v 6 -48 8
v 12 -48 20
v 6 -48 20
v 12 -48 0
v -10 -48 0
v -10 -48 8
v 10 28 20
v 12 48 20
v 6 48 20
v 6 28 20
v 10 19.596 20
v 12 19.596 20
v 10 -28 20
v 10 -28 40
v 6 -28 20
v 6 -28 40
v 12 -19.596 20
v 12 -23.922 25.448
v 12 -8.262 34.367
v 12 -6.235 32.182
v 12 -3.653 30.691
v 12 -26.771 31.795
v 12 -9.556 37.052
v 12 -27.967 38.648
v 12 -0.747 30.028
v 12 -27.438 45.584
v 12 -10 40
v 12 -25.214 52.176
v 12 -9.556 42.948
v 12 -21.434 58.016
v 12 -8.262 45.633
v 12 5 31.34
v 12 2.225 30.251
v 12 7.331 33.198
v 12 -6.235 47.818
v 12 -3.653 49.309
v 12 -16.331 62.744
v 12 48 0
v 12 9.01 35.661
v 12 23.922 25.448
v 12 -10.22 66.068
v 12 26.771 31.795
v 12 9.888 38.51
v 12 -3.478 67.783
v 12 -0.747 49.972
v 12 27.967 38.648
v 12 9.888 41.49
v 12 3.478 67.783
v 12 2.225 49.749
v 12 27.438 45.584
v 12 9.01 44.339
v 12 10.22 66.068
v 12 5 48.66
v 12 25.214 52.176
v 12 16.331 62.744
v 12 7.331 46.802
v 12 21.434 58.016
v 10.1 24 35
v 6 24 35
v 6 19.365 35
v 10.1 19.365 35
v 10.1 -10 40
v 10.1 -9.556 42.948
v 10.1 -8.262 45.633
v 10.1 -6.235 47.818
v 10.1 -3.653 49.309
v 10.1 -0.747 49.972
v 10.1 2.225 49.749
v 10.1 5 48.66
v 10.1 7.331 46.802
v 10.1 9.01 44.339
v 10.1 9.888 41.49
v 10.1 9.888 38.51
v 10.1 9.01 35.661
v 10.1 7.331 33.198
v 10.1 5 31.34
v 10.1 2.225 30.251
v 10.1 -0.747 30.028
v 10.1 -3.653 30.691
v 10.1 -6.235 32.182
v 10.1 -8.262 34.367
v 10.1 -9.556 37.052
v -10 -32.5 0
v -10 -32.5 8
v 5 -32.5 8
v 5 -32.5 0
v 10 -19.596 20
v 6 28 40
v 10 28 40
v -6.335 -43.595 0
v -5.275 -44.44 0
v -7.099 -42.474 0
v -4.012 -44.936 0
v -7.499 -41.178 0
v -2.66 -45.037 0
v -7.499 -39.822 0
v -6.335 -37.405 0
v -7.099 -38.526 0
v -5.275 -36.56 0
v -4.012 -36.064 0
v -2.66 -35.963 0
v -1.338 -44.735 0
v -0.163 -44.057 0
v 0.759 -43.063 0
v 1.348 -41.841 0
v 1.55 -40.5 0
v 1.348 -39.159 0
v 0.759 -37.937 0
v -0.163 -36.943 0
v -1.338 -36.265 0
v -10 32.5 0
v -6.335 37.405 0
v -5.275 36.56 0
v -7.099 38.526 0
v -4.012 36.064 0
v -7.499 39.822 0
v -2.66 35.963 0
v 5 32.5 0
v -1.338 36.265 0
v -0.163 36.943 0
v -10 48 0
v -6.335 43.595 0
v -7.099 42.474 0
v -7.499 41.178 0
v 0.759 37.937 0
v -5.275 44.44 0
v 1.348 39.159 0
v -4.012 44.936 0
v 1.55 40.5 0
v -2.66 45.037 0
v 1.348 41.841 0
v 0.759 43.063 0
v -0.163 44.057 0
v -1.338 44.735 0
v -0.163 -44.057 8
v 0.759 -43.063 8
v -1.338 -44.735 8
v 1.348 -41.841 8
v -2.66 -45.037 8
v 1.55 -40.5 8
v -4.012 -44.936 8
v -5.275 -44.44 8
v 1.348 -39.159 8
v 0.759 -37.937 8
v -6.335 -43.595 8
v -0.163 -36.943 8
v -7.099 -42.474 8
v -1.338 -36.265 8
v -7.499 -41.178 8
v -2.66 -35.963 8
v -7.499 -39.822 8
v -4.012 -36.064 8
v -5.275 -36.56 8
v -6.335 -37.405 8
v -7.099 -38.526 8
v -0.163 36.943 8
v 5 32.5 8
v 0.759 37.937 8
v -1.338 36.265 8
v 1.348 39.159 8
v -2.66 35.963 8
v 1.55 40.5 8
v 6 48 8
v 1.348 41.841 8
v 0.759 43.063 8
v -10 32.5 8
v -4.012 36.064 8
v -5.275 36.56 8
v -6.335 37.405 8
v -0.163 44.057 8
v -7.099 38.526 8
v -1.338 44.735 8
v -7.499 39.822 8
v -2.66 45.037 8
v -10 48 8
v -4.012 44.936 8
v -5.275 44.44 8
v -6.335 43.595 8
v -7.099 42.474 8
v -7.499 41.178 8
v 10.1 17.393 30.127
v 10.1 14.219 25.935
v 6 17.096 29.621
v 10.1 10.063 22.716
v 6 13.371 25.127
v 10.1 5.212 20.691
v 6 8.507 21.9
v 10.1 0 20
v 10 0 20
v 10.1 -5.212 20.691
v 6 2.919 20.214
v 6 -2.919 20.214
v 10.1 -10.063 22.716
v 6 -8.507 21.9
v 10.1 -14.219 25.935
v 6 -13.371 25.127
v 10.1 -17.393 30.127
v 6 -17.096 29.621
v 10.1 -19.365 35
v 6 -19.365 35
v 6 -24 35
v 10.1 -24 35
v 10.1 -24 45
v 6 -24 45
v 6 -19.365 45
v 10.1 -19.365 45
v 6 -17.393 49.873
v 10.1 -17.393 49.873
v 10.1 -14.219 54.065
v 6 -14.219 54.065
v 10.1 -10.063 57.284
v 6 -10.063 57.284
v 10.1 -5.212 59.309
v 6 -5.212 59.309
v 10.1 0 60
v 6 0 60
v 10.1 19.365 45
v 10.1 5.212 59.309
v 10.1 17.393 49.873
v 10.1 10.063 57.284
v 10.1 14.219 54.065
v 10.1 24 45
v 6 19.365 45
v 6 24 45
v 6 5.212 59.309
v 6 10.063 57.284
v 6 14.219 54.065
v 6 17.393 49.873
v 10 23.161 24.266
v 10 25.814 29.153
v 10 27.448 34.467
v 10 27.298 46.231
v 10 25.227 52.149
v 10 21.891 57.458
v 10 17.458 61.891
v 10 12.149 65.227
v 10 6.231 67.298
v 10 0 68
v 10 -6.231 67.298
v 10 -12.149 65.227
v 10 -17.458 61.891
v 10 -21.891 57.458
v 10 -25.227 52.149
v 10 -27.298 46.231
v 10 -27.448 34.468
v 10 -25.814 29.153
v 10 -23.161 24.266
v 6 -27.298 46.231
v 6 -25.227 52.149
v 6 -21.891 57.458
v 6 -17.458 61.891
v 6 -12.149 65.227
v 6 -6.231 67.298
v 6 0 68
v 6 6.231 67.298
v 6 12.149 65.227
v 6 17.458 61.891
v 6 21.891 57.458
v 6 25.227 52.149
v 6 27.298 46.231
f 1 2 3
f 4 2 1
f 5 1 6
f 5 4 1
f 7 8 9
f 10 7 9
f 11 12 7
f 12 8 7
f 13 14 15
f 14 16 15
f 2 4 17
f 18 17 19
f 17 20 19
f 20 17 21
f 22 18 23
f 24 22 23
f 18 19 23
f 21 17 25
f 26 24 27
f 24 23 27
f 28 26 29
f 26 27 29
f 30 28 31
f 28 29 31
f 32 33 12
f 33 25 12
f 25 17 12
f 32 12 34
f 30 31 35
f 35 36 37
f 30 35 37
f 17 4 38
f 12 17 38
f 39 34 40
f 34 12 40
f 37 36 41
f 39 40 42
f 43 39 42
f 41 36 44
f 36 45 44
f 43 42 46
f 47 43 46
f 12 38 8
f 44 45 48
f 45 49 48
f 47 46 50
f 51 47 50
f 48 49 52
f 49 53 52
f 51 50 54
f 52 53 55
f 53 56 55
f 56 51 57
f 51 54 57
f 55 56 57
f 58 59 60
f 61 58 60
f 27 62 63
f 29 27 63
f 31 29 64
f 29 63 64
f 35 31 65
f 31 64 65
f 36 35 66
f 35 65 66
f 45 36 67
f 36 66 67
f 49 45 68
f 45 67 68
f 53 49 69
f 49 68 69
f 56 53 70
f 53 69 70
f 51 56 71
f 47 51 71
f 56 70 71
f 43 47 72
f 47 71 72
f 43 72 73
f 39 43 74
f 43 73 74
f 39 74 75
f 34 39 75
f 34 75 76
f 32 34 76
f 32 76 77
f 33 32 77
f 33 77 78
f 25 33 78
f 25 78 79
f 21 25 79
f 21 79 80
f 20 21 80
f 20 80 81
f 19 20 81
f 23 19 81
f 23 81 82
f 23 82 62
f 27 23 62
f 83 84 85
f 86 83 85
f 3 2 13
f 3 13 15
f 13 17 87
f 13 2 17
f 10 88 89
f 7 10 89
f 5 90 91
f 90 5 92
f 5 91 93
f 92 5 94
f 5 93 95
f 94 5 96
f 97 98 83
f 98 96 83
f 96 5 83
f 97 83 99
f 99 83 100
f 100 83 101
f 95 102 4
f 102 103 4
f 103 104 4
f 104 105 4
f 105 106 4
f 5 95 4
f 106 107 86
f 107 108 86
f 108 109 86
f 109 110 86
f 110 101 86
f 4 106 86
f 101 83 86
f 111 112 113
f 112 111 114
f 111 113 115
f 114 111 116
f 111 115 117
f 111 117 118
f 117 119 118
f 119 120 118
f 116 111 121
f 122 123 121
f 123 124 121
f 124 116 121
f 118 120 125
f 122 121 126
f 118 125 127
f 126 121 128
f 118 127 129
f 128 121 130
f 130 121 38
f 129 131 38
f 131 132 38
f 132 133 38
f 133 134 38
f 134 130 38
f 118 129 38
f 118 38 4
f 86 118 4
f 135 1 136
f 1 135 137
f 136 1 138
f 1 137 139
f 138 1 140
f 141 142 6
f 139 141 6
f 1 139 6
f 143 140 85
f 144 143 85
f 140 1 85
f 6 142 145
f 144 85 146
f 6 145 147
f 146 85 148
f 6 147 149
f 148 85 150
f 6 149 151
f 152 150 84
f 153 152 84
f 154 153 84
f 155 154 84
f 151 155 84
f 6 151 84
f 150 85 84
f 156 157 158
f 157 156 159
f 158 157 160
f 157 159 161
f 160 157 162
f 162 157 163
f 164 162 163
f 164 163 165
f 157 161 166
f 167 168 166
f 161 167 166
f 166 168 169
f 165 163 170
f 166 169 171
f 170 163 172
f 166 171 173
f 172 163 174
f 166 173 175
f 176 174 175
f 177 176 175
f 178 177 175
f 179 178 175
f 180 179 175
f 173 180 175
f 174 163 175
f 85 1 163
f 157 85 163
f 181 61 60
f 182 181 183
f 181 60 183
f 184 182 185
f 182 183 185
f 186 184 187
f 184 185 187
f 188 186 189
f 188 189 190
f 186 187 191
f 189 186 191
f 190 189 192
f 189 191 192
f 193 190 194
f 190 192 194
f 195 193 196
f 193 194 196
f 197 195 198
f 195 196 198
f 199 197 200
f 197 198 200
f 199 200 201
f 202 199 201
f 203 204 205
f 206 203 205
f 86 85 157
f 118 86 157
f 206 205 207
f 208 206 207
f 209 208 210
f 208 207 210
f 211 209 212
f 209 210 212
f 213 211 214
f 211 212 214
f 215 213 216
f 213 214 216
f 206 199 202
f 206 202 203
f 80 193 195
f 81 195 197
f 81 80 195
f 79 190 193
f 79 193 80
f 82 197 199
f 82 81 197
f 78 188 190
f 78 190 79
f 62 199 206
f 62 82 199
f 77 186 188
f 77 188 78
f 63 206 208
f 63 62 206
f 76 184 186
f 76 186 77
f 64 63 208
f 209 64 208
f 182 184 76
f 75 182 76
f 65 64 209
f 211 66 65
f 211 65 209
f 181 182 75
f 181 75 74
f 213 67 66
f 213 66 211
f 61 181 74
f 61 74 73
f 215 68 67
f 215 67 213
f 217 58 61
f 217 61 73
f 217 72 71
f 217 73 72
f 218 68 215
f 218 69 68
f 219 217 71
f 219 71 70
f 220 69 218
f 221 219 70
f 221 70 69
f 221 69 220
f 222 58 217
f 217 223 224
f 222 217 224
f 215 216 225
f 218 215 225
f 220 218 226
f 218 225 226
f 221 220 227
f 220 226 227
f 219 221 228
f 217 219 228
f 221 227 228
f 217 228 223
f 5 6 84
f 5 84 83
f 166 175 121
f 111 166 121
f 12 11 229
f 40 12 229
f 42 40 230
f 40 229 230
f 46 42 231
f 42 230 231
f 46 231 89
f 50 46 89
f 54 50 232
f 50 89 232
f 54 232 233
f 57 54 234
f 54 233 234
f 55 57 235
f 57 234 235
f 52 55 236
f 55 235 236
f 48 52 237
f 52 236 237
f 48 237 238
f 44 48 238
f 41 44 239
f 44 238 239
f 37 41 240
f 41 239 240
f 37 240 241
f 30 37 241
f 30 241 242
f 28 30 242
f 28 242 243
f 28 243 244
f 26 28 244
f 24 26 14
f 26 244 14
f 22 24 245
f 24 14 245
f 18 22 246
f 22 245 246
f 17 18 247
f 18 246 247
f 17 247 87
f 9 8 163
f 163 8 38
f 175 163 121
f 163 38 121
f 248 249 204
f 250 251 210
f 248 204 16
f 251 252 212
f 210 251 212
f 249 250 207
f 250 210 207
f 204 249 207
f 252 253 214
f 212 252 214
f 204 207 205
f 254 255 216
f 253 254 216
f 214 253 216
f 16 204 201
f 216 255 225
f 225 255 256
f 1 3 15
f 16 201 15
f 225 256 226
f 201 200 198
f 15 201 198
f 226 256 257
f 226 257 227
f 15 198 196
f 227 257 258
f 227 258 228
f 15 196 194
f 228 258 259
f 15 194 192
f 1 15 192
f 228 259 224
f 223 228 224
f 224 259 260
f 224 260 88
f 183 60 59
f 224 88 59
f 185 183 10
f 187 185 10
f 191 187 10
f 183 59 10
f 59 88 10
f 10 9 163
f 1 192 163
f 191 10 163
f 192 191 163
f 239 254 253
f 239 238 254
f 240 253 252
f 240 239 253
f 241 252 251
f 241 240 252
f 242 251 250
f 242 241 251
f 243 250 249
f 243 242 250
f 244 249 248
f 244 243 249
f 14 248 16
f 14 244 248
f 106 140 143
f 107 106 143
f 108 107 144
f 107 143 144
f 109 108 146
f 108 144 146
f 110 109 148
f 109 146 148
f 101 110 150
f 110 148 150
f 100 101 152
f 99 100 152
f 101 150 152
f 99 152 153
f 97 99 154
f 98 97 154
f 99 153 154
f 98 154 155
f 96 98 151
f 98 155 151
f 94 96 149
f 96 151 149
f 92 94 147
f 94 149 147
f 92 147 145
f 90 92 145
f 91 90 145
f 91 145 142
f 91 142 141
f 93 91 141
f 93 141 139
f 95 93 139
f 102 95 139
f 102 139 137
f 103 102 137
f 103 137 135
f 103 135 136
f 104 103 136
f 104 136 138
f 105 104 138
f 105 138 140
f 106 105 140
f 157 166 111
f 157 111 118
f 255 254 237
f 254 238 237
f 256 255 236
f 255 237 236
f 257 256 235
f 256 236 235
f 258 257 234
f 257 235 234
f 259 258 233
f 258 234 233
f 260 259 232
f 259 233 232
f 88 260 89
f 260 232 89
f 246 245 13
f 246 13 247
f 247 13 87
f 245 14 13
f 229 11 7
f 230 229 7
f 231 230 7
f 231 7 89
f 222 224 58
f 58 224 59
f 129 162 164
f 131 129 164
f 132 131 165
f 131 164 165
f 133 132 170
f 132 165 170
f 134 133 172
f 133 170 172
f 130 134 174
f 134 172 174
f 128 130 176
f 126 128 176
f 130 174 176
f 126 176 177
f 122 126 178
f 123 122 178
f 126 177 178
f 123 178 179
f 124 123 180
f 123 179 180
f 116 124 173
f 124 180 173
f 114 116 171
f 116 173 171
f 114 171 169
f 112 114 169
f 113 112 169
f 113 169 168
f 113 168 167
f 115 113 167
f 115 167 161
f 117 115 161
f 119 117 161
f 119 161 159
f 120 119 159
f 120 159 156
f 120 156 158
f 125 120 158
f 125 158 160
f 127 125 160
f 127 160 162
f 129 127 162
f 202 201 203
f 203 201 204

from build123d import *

# Parameters (mm, degrees)
SKETCH_1_W          = 20
SKETCH_1_H          = 56
EXTRUDE_1_DEPTH     = 8
SKETCH_2_W          = 4
SKETCH_2_H          = 56
EXTRUDE_2_DEPTH     = 60
FILLET_1_R          = 28
SKETCH_5_R          = 28
EXTRUDE_3_DEPTH     = 2
CUT_EXTRUDE_2_DEPTH = 4.1
SKETCH_6_W          = 20
SKETCH_6_H          = 56
EXTRUDE_4_DEPTH     = 2
SKETCH_7_R          = 10
CUT_EXTRUDE_3_DEPTH = 2
EXTRUDE_5_DEPTH     = 20
SKETCH_3_R          = 4.55
CUT_EXTRUDE_1_DEPTH = 60
SKETCH_9_W          = 15
SKETCH_9_H          = 65
CUT_EXTRUDE_4_DEPTH = 78.768888381


with BuildPart() as part:
    # 스케치1 → 보스-돌출1 (new body)
    with BuildSketch(Plane.XY):
        Rectangle(SKETCH_1_W, SKETCH_1_H)
    extrude(amount=EXTRUDE_1_DEPTH)

    # 스케치2 → 보스-돌출2 (add)
    with BuildSketch(Plane.XY.offset(8)):
        with Locations((8, 0)):
            Rectangle(SKETCH_2_W, SKETCH_2_H)
    extrude(amount=EXTRUDE_2_DEPTH)

    # 필렛1
    fillet_1_edges = [part.edges().sort_by_distance(p)[0] for p in [
        (8, 28, 68),
        (8, -28, 68),
    ]]
    fillet(fillet_1_edges, radius=FILLET_1_R - 0.0001)  # a hair under: the kernel refuses the full size

    # 스케치5 → 보스-돌출3 (add)
    with BuildSketch(Plane(origin=(10, 0, 0), x_dir=(0, 0, -1), z_dir=(1, 0, 0))):
        with Locations(Location((-40, 0, 0), (0, 0, 90))):
            Circle(SKETCH_5_R)
    extrude(amount=EXTRUDE_3_DEPTH)

    # 스케치4 → 컷-돌출2 (cut)
    with BuildSketch(Plane.ZY.offset(-6)):
        with BuildLine():
            Line((35, 16), (35, 19.364916731))
            ThreePointArc((35, 19.364916731), (20, 0), (35, -19.364916731))
            Line((35, -19.364916731), (35, -16))
            Line((35, -16), (45, -16))
            Line((45, -16), (45, -19.364916731))
            ThreePointArc((45, -19.364916731), (55.811388301, -12.247448714), (60, 0))
            ThreePointArc((60, 0), (55.811388301, 12.247448714), (45, 19.364916731))
            Line((45, 19.364916731), (45, 16))
            Line((45, 16), (35, 16))
        make_face()
        with BuildLine():
            ThreePointArc((45, -19.364916731), (40, -20), (35, -19.364916731))
            Line((35, -19.364916731), (35, -24))
            Line((35, -24), (45, -24))
            Line((45, -24), (45, -19.364916731))
        make_face()
        with BuildLine():
            Line((35, -16), (35, -19.364916731))
            ThreePointArc((35, -19.364916731), (40, -20), (45, -19.364916731))
            Line((45, -19.364916731), (45, -16))
            Line((45, -16), (35, -16))
        make_face()
        with BuildLine():
            Line((45, 24), (35, 24))
            Line((35, 24), (35, 19.364916731))
            ThreePointArc((35, 19.364916731), (40, 20), (45, 19.364916731))
            Line((45, 19.364916731), (45, 24))
        make_face()
        with BuildLine():
            ThreePointArc((45, 19.364916731), (40, 20), (35, 19.364916731))
            Line((35, 19.364916731), (35, 16))
            Line((35, 16), (45, 16))
            Line((45, 16), (45, 19.364916731))
        make_face()
    extrude(amount=-CUT_EXTRUDE_2_DEPTH, mode=Mode.SUBTRACT)

    # 스케치6 → 보스-돌출4 (add)
    with BuildSketch(Plane(origin=(10, 0, 0), x_dir=(0, 0, -1), z_dir=(1, 0, 0))):
        with Locations((-10, 0)):
            Rectangle(SKETCH_6_W, SKETCH_6_H)
    extrude(amount=EXTRUDE_4_DEPTH)

    # 스케치7 → 컷-돌출3 (cut)
    with BuildSketch(Plane.ZY.offset(-10.1)):
        with Locations(Location((40, 0, 0), (0, 0, 270))):
            Circle(SKETCH_7_R)
    extrude(amount=-CUT_EXTRUDE_3_DEPTH, mode=Mode.SUBTRACT)

    # 스케치8 → 보스-돌출5 (add)
    with BuildSketch(Plane(origin=(0, 28, 0), x_dir=(1, 0, 0), z_dir=(0, 1, 0))):
        Polygon((-10, -8), (-10, 0), (12, 0), (12, -20), (6, -20), (6, -8), align=None)
    extrude_5 = extrude(amount=EXTRUDE_5_DEPTH)

    # 대칭 복사1: 보스-돌출5 across plane
    add(extrude_5.mirror(Plane.ZX))

    # 스케치3 → 컷-돌출1 (cut)
    with BuildSketch(Plane.XY.offset(8)):
        with Locations((-3, -40.5)):
            Circle(SKETCH_3_R)
        with Locations((-3, 40.5)):
            Circle(SKETCH_3_R)
    extrude(amount=-CUT_EXTRUDE_1_DEPTH, mode=Mode.SUBTRACT)

    # 스케치9 → 컷-돌출4 (cut, through all)
    with BuildSketch(Plane.XY.offset(8)):
        with Locations((-2.5, 0)):
            Rectangle(SKETCH_9_W, SKETCH_9_H)
    extrude(amount=-CUT_EXTRUDE_4_DEPTH, mode=Mode.SUBTRACT)


solid = part.part
